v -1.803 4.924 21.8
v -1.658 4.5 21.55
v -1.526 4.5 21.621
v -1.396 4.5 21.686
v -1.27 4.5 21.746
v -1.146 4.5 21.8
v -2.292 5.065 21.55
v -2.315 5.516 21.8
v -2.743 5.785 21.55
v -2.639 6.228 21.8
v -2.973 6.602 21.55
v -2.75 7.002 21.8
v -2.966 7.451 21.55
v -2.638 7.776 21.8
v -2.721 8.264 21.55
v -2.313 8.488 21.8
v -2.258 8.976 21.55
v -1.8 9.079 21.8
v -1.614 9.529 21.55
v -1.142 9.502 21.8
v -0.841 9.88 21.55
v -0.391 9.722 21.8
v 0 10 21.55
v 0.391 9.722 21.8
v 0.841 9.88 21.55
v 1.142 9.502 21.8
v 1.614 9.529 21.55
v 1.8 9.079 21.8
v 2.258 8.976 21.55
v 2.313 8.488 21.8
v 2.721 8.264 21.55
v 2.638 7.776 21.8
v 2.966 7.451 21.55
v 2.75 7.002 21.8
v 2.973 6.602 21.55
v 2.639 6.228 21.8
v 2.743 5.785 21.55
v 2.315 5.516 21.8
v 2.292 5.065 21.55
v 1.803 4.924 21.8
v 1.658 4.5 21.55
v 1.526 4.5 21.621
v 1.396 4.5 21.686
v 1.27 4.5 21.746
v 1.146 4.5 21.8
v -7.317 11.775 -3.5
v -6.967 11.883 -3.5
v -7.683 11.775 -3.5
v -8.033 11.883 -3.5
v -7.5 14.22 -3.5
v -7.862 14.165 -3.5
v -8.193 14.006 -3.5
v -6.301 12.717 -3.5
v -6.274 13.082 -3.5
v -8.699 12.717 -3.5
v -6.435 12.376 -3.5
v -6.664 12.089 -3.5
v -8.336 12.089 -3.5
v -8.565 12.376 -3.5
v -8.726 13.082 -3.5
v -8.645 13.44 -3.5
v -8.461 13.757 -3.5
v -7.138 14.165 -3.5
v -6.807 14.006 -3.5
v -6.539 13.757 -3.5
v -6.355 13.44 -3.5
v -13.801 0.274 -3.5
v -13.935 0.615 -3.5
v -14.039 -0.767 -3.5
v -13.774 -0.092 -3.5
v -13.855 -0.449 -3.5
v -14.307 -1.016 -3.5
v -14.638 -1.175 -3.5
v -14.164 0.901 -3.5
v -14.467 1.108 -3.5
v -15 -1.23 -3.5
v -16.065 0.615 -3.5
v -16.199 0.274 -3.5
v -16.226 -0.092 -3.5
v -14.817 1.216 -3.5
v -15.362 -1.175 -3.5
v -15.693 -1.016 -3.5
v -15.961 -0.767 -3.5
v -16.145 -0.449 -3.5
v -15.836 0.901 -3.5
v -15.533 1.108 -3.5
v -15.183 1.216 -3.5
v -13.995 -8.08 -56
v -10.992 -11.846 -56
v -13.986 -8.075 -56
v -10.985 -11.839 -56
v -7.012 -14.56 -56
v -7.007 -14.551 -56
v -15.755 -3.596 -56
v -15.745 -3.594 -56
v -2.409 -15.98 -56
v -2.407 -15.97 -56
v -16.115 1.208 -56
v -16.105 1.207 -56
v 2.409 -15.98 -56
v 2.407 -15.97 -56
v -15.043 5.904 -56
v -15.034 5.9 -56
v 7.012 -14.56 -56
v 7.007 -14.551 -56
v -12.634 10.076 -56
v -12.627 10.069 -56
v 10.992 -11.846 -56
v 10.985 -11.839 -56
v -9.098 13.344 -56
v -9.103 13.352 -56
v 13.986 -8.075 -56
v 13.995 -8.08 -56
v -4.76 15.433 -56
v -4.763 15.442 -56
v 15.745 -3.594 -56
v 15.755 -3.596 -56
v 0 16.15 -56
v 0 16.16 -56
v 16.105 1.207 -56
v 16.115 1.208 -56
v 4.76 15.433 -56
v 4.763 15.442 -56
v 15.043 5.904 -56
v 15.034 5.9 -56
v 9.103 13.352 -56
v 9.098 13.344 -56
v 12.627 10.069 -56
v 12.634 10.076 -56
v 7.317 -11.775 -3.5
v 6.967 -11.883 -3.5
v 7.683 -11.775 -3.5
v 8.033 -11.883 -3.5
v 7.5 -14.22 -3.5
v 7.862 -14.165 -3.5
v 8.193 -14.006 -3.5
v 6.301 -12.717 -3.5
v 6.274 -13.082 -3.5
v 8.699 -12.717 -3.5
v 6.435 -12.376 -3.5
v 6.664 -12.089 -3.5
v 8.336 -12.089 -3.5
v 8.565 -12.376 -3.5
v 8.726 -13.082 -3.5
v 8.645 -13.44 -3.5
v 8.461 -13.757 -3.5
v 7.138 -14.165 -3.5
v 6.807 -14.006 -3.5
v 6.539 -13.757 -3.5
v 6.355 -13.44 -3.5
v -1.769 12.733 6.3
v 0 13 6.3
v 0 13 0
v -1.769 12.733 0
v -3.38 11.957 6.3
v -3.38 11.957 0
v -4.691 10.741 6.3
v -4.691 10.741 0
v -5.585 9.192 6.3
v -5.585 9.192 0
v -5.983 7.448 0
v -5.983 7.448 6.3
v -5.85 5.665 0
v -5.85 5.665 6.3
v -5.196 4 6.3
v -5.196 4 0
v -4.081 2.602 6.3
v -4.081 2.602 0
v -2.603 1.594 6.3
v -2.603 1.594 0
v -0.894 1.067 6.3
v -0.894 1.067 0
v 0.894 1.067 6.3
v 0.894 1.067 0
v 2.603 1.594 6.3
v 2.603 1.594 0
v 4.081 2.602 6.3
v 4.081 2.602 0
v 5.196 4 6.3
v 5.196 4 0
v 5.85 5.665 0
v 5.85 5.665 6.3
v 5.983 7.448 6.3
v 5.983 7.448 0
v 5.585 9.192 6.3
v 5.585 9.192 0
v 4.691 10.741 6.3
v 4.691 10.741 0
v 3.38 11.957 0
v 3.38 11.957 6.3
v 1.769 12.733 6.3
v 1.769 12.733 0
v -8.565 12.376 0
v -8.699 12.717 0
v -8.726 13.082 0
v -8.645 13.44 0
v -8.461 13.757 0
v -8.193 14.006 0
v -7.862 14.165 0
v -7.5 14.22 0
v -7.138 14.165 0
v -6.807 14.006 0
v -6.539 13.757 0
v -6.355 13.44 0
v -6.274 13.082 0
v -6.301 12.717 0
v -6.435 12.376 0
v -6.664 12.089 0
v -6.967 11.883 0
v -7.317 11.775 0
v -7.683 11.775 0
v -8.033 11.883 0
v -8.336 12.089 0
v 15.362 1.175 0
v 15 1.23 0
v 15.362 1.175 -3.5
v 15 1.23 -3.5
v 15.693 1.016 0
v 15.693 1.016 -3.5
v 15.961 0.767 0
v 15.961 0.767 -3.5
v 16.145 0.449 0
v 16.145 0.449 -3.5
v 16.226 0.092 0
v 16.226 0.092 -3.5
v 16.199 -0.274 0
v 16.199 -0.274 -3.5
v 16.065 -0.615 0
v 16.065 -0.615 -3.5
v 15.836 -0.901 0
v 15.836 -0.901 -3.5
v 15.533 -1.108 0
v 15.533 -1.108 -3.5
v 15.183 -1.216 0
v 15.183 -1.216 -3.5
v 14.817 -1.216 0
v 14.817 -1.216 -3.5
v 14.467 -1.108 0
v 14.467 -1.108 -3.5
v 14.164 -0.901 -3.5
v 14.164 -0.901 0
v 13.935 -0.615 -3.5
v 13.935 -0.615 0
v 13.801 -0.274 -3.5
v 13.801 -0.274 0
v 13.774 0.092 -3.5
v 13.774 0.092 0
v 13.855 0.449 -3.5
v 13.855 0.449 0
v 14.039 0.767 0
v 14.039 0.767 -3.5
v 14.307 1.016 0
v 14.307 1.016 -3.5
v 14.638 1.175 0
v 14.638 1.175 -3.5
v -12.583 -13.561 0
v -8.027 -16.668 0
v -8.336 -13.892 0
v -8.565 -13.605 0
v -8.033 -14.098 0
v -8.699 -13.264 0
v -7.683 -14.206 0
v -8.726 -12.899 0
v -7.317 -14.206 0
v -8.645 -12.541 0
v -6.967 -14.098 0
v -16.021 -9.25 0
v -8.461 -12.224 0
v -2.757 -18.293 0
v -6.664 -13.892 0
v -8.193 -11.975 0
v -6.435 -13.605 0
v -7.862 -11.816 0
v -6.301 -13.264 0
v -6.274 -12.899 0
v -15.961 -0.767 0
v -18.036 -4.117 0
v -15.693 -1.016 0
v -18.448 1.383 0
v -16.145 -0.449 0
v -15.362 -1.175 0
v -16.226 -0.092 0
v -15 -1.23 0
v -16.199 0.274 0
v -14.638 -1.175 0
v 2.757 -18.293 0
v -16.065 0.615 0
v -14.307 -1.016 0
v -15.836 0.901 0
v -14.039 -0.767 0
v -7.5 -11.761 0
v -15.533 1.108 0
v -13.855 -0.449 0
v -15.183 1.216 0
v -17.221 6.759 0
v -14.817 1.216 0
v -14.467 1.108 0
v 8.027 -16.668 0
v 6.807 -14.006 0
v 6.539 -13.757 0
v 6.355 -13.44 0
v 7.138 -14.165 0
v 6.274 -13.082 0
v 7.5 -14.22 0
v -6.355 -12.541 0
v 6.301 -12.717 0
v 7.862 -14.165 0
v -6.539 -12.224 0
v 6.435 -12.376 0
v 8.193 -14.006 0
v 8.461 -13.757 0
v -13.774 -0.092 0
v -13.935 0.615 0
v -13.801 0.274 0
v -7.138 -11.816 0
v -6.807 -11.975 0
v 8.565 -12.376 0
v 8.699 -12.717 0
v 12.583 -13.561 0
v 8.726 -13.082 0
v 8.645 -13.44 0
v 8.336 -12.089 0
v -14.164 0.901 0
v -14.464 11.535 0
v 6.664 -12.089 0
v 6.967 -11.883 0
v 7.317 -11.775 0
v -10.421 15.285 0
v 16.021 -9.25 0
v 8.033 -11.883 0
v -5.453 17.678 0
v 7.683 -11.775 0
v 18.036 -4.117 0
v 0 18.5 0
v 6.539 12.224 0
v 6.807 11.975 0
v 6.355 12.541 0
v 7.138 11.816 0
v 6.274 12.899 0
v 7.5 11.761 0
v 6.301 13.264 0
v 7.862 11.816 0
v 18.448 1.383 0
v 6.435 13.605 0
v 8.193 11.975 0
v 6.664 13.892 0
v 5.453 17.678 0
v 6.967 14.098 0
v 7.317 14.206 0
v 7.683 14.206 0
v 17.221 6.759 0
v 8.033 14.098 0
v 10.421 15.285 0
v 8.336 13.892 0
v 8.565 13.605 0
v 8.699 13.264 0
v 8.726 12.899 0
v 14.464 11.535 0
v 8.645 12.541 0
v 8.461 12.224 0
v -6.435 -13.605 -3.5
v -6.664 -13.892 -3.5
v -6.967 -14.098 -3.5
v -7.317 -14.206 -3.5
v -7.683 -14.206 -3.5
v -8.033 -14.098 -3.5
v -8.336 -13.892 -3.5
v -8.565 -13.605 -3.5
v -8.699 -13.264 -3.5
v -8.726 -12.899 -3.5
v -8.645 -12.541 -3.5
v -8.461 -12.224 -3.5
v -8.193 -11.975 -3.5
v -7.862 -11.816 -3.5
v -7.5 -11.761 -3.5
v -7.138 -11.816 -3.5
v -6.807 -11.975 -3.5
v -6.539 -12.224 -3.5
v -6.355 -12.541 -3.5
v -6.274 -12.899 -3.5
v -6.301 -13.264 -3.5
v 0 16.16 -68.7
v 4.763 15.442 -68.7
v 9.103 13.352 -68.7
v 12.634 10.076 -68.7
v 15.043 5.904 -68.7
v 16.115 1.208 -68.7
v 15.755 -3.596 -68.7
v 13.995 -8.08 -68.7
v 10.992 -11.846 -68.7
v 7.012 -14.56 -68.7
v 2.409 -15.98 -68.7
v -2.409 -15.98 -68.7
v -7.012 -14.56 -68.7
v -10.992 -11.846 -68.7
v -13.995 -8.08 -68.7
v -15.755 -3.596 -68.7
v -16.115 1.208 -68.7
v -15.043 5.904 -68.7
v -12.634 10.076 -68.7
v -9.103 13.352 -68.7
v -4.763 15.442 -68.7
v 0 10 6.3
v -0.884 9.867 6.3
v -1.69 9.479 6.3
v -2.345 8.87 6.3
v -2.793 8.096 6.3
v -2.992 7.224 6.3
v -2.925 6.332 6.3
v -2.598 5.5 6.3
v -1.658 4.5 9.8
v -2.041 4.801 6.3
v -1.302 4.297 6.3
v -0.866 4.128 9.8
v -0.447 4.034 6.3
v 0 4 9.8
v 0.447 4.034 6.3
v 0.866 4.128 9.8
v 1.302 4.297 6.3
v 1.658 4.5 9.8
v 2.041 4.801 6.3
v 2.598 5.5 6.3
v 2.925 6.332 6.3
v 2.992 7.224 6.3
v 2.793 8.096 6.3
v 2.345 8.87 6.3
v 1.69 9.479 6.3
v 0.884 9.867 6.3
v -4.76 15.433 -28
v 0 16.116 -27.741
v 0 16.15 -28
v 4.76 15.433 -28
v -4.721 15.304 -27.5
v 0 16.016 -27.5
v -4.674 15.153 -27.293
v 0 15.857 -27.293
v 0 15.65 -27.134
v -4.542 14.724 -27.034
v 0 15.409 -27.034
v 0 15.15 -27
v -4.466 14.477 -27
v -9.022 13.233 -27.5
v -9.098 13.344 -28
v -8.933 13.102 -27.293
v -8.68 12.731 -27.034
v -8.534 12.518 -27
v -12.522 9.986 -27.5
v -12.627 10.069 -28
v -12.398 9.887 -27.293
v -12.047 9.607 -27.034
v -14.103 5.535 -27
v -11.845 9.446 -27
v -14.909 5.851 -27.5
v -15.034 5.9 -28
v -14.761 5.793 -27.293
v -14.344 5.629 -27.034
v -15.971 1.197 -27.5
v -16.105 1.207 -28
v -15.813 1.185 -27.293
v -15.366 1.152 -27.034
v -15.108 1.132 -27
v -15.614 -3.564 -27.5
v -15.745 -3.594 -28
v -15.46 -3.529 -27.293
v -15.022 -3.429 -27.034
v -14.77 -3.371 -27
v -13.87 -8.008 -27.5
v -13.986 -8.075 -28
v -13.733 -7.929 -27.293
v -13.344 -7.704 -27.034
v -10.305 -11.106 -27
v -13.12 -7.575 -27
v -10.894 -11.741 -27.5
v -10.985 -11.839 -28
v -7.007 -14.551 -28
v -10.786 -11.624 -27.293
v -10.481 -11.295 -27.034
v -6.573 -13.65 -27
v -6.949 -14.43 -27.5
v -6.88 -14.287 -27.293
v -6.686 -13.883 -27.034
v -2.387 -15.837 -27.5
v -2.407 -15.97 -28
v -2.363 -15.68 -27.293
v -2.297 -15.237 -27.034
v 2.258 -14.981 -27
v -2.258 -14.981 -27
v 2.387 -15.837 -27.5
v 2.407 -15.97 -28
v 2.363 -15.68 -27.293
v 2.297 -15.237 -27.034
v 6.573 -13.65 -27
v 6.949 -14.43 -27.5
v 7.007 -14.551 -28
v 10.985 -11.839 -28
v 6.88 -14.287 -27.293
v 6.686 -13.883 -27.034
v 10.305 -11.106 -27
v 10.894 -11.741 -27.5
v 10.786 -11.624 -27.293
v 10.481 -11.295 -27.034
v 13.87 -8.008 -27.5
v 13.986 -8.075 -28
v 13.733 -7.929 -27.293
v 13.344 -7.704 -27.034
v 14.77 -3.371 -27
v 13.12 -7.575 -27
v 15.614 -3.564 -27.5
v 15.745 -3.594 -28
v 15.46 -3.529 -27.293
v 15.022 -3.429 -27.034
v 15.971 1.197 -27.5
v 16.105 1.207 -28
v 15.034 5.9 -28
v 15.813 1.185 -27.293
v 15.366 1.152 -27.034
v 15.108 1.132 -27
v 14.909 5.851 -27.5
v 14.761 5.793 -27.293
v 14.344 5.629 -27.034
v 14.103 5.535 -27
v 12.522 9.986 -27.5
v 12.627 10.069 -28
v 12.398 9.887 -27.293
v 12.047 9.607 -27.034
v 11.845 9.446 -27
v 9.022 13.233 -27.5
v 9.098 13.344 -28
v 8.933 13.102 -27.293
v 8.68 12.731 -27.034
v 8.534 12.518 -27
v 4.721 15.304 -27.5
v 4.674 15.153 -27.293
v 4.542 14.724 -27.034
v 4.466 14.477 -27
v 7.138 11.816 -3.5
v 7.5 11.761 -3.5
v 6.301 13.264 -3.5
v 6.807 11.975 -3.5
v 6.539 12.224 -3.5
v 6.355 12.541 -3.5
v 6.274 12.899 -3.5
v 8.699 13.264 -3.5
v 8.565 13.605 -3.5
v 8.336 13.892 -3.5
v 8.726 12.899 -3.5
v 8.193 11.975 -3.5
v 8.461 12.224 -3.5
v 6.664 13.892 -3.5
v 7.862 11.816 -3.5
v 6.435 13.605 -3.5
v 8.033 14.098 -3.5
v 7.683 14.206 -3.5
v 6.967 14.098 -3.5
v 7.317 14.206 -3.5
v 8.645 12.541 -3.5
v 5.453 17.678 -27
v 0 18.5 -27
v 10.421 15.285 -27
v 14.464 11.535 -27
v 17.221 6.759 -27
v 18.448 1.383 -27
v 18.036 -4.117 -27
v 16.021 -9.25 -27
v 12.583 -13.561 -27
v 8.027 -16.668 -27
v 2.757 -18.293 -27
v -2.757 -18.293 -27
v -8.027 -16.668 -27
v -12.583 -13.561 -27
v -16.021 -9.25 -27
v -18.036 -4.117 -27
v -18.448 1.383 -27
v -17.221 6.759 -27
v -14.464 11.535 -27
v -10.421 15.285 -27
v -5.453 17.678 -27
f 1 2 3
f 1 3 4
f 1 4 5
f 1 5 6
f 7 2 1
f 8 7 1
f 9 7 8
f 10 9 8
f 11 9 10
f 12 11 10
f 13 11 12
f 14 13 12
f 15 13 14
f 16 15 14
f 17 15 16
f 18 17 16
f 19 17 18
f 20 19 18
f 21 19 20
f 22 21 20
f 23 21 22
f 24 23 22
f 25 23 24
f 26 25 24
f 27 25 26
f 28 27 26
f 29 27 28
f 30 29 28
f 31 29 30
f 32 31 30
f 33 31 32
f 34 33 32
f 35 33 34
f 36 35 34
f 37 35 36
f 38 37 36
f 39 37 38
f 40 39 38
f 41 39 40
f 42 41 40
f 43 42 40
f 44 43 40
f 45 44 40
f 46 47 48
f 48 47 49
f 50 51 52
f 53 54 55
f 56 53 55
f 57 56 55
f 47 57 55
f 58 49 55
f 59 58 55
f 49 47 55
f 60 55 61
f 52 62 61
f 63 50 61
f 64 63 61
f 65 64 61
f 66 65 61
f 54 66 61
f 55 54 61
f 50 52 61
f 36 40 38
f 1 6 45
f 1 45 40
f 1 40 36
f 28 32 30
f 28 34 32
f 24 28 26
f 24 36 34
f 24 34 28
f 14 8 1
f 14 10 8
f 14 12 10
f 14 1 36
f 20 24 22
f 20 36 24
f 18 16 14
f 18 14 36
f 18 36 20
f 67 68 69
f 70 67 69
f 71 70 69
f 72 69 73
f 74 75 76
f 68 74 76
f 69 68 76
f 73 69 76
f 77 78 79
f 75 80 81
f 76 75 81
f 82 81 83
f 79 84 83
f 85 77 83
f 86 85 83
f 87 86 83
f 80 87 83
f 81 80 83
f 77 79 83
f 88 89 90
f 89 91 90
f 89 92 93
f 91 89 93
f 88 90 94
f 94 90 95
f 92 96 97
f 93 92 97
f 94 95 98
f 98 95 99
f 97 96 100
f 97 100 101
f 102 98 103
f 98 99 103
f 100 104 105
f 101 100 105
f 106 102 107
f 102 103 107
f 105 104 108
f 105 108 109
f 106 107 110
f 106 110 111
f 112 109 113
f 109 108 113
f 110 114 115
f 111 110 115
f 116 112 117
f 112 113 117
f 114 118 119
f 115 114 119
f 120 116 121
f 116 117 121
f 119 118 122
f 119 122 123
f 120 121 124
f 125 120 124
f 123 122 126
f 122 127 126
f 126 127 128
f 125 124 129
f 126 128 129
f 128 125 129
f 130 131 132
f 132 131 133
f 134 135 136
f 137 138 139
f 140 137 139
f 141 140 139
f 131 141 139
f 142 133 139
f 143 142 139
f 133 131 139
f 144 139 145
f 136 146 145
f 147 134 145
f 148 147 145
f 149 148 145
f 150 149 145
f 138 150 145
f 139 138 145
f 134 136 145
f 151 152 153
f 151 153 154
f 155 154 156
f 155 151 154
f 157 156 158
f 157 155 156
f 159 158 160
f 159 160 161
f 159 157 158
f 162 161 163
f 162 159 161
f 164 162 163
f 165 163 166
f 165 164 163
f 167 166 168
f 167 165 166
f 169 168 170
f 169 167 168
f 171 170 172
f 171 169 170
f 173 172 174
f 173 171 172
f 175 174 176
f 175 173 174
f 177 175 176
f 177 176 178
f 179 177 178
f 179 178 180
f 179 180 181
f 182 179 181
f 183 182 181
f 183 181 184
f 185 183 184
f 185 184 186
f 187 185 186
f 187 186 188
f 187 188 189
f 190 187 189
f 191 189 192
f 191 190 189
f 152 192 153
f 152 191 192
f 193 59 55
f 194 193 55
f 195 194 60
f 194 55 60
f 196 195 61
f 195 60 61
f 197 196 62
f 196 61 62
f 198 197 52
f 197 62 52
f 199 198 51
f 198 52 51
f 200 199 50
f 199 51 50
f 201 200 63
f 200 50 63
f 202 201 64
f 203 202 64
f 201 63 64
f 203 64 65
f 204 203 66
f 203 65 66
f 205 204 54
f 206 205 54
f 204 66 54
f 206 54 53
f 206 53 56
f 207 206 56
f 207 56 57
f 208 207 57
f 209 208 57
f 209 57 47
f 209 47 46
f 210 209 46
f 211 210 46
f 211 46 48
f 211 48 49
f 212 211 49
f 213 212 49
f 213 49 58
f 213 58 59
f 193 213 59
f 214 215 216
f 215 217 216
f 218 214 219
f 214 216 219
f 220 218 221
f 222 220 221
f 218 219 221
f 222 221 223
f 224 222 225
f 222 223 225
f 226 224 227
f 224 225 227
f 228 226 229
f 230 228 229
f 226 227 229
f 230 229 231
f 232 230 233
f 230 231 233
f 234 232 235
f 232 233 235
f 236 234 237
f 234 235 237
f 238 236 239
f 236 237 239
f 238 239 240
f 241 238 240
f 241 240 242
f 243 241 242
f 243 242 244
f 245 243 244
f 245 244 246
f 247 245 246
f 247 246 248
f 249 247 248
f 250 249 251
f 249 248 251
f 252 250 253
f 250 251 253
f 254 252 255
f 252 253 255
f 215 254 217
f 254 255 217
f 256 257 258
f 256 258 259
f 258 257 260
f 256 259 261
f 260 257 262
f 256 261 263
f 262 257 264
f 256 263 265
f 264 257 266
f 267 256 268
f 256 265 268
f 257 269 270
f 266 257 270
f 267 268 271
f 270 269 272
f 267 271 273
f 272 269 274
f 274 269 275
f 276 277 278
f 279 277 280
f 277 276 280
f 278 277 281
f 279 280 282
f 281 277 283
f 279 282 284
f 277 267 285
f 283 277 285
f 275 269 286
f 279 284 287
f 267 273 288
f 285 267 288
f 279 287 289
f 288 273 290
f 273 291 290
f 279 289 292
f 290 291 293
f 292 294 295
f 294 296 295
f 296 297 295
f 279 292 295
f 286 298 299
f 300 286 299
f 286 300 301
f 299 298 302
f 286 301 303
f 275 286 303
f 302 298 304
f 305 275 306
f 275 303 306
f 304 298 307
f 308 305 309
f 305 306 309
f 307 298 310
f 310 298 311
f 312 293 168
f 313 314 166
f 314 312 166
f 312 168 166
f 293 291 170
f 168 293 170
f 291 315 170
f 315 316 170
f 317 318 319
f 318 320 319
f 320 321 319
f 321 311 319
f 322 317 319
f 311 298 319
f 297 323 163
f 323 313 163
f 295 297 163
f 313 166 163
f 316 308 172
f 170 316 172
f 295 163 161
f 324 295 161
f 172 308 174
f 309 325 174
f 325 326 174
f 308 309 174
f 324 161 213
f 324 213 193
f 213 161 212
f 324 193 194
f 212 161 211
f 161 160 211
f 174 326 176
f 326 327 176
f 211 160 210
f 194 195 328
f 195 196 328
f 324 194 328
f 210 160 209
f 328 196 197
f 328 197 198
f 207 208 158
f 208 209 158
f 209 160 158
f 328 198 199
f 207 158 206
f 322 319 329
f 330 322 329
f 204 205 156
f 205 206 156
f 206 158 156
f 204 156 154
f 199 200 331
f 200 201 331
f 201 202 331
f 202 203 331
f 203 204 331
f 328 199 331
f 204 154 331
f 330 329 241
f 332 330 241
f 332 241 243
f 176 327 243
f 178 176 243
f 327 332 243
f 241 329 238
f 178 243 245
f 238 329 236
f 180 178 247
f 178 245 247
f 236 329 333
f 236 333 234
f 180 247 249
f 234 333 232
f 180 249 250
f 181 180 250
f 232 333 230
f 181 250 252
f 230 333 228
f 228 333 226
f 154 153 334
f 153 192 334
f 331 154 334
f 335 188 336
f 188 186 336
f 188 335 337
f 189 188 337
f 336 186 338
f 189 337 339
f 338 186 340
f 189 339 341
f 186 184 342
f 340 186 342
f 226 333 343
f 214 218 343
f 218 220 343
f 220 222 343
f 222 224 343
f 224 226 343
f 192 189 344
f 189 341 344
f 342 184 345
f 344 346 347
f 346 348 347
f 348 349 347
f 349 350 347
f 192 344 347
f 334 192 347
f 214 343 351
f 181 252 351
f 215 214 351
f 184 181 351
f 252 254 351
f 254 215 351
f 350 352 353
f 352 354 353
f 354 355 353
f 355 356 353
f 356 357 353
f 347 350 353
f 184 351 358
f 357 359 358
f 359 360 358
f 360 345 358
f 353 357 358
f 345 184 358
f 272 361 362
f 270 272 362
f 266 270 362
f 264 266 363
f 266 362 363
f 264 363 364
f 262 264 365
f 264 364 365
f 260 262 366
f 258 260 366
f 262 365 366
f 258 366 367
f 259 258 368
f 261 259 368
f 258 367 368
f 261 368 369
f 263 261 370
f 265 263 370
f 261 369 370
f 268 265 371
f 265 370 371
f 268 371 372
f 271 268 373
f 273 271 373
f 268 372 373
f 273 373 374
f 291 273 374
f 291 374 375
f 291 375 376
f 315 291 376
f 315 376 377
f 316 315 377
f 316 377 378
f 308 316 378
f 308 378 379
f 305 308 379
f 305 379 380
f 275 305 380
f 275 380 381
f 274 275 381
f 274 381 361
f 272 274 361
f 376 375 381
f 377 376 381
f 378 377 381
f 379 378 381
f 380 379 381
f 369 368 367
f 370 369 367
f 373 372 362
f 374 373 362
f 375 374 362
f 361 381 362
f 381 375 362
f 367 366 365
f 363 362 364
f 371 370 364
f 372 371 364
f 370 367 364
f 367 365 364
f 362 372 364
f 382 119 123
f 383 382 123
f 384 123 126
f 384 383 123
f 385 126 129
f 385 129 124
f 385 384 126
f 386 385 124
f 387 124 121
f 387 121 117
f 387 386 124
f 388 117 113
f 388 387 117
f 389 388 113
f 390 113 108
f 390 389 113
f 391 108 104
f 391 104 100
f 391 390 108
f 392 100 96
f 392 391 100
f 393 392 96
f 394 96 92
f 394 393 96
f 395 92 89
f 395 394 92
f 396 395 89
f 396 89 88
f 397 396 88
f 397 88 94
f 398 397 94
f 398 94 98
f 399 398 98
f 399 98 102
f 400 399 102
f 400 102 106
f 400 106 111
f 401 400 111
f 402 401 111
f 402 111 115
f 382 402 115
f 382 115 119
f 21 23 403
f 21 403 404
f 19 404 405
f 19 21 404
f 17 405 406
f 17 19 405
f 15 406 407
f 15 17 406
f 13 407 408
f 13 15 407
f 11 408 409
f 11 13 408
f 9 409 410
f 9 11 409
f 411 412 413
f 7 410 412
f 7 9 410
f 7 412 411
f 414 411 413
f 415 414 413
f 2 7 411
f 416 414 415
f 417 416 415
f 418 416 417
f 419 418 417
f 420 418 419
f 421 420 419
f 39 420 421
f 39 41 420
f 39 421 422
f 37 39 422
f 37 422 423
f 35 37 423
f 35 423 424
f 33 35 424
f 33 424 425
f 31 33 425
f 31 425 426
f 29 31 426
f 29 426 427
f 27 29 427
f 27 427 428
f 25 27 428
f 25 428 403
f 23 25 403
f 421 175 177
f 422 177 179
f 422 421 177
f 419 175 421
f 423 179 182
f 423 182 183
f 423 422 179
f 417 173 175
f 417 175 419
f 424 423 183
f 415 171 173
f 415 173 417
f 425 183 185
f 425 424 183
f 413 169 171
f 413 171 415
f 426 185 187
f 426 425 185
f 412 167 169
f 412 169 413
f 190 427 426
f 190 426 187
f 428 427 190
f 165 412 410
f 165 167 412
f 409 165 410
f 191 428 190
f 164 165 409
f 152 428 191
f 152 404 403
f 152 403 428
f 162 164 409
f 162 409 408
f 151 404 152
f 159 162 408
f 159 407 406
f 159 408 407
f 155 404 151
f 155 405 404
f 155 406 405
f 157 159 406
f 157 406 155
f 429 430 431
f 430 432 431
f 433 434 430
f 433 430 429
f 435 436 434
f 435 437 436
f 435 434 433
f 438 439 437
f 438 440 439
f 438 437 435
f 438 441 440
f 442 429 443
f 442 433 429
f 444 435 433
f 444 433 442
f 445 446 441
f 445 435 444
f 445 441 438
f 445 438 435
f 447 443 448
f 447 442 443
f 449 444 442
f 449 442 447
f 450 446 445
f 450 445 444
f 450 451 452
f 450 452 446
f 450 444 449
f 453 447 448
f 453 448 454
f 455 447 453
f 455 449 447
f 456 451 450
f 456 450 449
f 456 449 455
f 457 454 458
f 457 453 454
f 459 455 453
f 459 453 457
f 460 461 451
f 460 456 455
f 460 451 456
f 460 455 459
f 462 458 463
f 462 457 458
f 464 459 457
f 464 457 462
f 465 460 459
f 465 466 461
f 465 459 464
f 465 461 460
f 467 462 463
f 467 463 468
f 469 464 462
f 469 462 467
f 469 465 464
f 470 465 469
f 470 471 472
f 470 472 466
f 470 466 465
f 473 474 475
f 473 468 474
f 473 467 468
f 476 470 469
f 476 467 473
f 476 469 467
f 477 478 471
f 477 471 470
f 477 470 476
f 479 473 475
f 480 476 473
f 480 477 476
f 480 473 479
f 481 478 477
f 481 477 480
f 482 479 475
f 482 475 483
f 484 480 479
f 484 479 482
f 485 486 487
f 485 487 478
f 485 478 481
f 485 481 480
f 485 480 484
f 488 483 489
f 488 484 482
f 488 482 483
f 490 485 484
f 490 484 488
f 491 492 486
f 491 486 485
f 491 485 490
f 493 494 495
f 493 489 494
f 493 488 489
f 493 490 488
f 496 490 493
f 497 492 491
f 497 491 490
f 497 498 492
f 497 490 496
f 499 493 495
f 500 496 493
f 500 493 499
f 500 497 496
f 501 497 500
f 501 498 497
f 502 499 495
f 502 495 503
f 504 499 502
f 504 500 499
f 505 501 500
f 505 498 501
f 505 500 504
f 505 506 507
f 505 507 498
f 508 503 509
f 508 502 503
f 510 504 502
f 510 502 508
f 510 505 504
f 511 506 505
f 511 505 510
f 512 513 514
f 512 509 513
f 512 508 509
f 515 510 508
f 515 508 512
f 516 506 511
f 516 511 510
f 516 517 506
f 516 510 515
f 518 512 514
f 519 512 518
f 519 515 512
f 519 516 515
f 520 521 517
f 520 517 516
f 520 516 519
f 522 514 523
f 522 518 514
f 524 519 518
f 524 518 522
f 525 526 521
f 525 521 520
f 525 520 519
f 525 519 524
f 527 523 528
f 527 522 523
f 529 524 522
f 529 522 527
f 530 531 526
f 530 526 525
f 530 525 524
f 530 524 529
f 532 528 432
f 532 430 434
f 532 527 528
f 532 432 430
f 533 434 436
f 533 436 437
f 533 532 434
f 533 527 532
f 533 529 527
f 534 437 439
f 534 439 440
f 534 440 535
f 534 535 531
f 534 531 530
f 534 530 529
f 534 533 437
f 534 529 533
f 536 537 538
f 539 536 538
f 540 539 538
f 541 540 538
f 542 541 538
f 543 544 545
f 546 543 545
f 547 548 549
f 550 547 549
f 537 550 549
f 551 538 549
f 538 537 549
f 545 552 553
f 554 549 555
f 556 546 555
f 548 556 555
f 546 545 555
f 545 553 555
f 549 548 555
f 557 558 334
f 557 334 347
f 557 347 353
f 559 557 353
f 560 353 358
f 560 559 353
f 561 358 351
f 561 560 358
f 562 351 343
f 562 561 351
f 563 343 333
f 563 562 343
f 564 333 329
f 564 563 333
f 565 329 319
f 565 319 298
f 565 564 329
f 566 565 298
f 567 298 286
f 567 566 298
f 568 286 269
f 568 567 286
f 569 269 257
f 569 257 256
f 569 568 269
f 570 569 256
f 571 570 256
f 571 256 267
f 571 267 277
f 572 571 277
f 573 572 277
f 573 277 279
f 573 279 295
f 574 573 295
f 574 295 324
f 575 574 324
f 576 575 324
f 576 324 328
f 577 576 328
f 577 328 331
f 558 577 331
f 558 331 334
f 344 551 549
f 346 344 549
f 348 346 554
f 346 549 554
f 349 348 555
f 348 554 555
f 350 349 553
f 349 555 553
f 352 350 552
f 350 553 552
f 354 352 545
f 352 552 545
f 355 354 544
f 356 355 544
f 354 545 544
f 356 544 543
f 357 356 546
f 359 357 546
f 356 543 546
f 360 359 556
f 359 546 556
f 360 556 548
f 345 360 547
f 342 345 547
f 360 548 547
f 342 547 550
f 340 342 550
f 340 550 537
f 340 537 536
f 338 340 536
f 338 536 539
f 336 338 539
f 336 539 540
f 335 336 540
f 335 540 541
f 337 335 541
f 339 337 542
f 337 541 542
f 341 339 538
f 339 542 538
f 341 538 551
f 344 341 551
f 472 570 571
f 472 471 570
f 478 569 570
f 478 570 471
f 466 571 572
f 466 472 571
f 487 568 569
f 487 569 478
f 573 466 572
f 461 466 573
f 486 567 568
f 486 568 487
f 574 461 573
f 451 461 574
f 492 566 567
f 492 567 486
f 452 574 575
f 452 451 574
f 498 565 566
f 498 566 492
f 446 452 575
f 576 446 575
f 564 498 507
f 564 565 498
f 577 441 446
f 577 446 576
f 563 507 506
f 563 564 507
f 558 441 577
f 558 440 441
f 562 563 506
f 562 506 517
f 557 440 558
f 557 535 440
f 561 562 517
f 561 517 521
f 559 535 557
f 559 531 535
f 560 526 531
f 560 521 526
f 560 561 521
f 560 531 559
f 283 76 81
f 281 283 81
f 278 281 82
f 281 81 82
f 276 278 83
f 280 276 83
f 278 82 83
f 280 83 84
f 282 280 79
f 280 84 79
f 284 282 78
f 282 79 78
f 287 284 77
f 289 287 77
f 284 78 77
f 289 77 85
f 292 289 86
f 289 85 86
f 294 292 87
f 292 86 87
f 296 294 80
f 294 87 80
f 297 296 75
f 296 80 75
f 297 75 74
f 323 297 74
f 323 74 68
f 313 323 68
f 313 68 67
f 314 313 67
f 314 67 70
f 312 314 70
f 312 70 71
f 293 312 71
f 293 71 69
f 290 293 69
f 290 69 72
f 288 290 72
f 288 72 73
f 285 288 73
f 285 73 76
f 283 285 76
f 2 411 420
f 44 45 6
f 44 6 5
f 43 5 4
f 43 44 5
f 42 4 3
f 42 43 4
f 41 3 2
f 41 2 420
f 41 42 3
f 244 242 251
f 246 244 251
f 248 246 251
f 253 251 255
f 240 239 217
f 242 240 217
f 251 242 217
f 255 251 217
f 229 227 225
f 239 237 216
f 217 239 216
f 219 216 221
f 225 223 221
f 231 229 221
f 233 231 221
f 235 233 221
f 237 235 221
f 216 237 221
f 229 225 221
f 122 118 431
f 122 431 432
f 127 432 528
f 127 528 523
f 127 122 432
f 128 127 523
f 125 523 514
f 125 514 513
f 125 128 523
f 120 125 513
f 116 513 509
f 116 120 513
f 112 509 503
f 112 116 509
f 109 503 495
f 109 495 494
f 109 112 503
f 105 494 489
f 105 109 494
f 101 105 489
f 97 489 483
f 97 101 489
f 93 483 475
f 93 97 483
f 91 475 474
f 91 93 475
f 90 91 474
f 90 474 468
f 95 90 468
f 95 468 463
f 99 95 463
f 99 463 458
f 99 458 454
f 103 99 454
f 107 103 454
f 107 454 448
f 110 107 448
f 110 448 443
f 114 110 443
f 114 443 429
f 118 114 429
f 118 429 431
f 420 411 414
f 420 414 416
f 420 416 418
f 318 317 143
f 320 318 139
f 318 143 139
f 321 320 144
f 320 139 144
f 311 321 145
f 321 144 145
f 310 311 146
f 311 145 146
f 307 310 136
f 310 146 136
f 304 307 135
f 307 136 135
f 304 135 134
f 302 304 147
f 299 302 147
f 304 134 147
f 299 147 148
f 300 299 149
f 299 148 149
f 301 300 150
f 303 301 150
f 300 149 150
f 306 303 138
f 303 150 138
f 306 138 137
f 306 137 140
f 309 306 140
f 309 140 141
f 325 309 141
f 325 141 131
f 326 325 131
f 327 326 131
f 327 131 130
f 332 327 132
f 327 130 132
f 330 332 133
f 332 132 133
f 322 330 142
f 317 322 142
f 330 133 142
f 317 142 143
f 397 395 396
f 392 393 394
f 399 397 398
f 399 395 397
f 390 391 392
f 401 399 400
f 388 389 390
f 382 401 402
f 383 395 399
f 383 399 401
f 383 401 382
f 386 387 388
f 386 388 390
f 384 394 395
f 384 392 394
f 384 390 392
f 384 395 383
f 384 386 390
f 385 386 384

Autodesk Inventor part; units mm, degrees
ref_plane "YZ Plane" through (0, 0, 0) normal (1, 0, 0) x (0, 1, 0)
ref_plane "XZ Plane" through (0, 0, 0) normal (0, 1, 0) x (-1, 0, 0)
ref_plane "XY Plane" through (0, 0, 0) normal (0, 0, 1) x (1, 0, 0)
sketch "Sketch2" plane through (0, 0, 0) normal (1, 0, 0) x (0, 1, 0)
  line L0 (0, 0) -> (0, -90.5559) construction
  line L1 (0, 0) -> (18.5, 0)
  line L2 (18.5, 0) -> (18.5, -27)
  line L3 (18.5, -27) -> (0, -27)
  line L4 (0, -27) -> (0, 0)
  line L5 (0, -27) -> (16.15, -27)
  line L6 (16.15, -28) -> (16.15, -56)
  line L7 (16.15, -56) -> (0, -56)
  line L8 (0, -56) -> (0, -27)
  line L9 (0, -56) -> (16.16, -56)
  line L10 (16.16, -56) -> (16.16, -68.7)
  line L11 (16.16, -68.7) -> (0, -68.7)
  line L12 (0, -68.7) -> (0, -56)
  arc A0 (16.15, -28) -> (15.15, -27) centre (15.15, -28) ccw
  line L13 (16.15, -28) -> (15.15, -28) construction
  line L14 (15.15, -27) -> (15.15, -28) construction
  dimension "d1" = 27
  dimension "d3" = 41.7
  dimension "d4" = 37
  dimension "d5" = 0.01
  dimension "d6" = 2.35
  dimension "d7" = 29
  dimension "d8" = 1
  dimension "d9" = 90
revolve "Revolution1" add sketch "Sketch2" angle 360 about axis through (0, 0, 0) along (0, 0, -1)
sketch "Sketch4" plane through (0, 0, 0) normal (1, 0, 0) x (0, 1, 0)
  line L0 (7, 0) -> (7, 36.4313)
  line L1 (7, 0) -> (0, 0)
  line L2 (-18.5, 0) -> (18.5, 0) projected
  line L3 (7, 0) -> (13, 0)
  line L4 (13, 0) -> (13, 6.3)
  line L5 (13, 6.3) -> (7, 6.3)
  line L6 (7, 6.3) -> (7, 0)
  line L7 (7, 6.3) -> (10, 6.3)
  line L8 (10, 6.3) -> (10, 21.8)
  line L9 (10, 21.8) -> (7, 21.8)
  line L10 (7, 21.8) -> (7, 6.3)
  dimension "d12" = 7
  dimension "d13" = 6.3
  dimension "d14" = 12
  dimension "d15" = 15.5
  dimension "d16" = 6
revolve "Revolution2" add sketch "Sketch4" angle 360 about axis through (0, 7, 0) along (0, 0, 1)
chamfer "Chamfer1" distance 0.25 angle 45 1 edges at (0, 4, 21.8)
sketch "Sketch5" plane through (0, 7, 21.8) normal (0, 0, 1) x (1, 0, 0)
  circle A0 centre (0, 0) radius 3 projected
  line L0 (-1.6583, -2.5) -> (1.6583, -2.5)
  point P0 (0, -7)
  point P1 (0, 3)
  dimension "d18" = 5.5
extrude "Extrusion1" cut sketch "Sketch5" against normal blind 12 contours L0 A0 picked at (-0.3442, -2.6056)
sketch "Sketch6" plane through (0, 0, 0) normal (0, 0, 1) x (1, 0, 0)
  point P0 (0, 0)
  point P1 (-15, 0)
  dimension "d24" = 15
hole "Hole1" at (-15, 0, 0) direction (0, 0, -1) diameter 2.459 depth 3.5 thread size "M3x0.5" class "6H" standard "ISO Metric profile"
pattern_circular "Circular Pattern1" count 6 over 360 about axis through (0, 0, -13.5) along (0, 0, -1) of "Hole1"
equation "\"BendRadius\" = Thickness"
equation "\"BendReliefWidth\" = Thickness"
equation "\"BendReliefDepth\" = 0.5 * Thickness"
equation "\"CornerReliefSize\" = 4 * Thickness"
equation "\"MinimumRemnant\" = 2 * Thickness"
equation "\"TransitionRadius\" = BendRadius"
equation "\"JacobiRadiusSize\" = BendRadius"
equation "\"GapSize\" = Thickness"
equation "\"Thickness\" = 3.048"
properties part number "Vince-Motor"
